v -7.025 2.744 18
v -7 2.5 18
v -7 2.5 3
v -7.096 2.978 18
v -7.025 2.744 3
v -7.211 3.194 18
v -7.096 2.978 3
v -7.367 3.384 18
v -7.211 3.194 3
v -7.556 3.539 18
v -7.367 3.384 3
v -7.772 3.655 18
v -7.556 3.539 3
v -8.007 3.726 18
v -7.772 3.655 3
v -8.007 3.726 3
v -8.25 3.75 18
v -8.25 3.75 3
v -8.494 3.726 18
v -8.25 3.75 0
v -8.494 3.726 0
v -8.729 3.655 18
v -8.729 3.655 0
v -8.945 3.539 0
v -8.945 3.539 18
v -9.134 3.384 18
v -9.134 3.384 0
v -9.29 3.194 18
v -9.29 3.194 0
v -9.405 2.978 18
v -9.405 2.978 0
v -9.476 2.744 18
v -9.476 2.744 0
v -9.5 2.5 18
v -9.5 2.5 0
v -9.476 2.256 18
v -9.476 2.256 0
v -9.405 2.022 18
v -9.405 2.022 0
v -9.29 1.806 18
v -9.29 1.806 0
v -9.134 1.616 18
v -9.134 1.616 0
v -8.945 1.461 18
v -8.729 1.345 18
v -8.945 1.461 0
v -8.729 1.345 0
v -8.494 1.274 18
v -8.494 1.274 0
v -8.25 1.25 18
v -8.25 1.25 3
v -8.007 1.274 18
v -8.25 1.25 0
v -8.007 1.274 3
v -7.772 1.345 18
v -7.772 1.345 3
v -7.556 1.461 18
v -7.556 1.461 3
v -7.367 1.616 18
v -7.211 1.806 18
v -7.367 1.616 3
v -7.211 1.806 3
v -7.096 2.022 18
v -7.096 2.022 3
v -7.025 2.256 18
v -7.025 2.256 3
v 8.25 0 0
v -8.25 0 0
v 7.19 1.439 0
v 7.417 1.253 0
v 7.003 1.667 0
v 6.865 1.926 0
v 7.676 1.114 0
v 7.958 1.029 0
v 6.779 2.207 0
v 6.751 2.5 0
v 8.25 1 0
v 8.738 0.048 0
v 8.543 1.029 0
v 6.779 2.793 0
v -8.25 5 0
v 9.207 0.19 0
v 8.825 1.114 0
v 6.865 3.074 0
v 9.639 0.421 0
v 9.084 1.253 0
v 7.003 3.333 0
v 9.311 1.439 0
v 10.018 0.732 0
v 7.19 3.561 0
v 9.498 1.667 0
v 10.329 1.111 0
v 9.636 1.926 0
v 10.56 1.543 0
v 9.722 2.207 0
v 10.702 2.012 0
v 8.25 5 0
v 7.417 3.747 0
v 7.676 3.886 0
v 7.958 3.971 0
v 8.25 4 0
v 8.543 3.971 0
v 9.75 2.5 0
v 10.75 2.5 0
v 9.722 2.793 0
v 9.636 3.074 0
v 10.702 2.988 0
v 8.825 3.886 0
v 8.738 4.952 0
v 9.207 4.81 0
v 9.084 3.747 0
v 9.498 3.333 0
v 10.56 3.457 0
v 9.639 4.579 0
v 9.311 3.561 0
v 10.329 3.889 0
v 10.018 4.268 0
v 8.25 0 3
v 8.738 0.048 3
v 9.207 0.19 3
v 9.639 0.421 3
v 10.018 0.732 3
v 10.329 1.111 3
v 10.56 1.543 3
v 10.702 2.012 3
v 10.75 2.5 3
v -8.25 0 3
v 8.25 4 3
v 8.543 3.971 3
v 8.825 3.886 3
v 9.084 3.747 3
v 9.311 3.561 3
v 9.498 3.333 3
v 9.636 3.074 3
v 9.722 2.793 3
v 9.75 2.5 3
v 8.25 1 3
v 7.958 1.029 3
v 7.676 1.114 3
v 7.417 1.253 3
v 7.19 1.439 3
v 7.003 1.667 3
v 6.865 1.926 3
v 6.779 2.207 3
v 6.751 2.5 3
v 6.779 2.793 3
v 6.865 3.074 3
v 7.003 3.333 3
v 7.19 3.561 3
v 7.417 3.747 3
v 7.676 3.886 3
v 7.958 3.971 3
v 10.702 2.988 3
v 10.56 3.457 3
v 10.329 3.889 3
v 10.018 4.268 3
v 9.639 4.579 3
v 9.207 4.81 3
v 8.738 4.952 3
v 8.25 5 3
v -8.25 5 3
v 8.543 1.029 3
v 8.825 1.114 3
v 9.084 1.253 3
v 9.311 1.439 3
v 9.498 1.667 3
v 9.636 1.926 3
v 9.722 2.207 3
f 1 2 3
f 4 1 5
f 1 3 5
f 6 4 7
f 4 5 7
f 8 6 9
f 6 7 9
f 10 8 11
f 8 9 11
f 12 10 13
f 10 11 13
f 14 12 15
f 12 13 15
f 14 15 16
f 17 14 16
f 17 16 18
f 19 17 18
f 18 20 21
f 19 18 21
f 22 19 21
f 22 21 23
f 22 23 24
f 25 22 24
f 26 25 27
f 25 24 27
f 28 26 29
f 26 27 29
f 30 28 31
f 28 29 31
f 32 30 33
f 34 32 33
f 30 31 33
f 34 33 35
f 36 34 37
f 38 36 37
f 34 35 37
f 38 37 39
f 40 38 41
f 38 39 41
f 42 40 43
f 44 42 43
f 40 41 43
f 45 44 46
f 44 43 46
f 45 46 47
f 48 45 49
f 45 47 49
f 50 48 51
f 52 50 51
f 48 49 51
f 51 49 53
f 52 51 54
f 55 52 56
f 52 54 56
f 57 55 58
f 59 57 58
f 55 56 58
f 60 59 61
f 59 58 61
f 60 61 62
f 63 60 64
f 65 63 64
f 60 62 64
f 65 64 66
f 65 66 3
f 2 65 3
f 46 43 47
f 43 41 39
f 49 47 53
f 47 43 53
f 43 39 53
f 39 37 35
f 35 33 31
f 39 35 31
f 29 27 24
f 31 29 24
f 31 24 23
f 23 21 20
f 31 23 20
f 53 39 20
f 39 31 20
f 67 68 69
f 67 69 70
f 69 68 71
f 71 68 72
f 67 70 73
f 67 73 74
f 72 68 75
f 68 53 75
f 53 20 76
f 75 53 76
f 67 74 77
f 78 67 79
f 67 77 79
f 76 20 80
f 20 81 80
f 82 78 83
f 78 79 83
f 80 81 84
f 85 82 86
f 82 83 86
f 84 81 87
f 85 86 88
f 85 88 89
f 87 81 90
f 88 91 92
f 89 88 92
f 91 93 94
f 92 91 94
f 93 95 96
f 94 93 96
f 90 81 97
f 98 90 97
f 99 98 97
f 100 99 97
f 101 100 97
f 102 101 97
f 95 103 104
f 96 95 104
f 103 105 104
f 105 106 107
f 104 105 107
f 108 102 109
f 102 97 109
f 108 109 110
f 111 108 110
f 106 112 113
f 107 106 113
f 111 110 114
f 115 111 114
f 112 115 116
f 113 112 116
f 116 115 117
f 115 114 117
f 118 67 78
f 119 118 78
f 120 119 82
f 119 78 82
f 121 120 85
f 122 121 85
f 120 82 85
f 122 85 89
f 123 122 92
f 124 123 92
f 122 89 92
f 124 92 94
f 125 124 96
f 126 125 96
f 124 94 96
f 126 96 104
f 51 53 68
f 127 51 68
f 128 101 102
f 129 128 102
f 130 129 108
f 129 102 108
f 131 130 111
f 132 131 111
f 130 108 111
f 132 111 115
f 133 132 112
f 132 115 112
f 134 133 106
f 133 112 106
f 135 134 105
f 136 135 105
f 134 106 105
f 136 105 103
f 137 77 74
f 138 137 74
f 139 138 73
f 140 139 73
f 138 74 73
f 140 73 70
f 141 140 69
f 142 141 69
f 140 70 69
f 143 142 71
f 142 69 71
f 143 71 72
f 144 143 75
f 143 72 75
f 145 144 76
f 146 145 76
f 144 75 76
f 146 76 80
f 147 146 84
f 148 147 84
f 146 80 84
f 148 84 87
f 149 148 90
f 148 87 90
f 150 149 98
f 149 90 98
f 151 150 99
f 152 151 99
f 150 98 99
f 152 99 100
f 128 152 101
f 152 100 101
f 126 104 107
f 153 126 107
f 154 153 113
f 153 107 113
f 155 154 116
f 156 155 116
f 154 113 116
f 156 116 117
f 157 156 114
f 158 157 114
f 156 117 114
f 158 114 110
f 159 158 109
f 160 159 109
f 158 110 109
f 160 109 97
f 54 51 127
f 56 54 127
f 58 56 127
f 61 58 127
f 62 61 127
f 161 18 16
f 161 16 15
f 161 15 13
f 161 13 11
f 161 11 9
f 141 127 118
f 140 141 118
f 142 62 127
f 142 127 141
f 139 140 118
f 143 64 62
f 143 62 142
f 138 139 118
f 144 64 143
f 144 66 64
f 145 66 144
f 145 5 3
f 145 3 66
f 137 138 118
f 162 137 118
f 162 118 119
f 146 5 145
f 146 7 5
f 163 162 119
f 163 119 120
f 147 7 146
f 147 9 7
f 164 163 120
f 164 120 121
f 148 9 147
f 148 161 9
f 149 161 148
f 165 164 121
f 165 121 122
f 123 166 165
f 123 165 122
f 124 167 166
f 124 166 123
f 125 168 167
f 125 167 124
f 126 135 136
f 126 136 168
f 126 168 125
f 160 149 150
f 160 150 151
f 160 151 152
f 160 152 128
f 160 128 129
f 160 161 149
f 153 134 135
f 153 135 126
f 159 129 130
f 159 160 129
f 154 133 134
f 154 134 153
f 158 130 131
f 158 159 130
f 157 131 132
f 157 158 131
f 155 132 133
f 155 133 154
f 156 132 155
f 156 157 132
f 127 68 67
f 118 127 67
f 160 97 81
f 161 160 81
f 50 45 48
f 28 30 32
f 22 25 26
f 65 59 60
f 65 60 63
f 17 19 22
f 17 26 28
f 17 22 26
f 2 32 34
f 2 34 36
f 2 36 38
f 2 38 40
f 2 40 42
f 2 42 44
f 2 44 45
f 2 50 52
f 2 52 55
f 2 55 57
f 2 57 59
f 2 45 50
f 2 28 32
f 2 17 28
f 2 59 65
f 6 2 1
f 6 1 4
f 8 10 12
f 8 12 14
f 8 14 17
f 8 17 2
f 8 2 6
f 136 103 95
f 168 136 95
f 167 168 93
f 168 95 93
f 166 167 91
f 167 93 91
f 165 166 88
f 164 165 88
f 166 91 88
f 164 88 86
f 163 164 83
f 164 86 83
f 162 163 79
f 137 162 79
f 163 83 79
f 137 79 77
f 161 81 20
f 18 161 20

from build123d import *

# Parameters (mm, degrees)
F1_DEPTH = 3
F2_DEPTH = 18


with BuildPart() as f1:
    # F0 (on Top) → F1 (new body)
    with BuildSketch(Plane.XY):
        with BuildLine():
            Line((8.2505, 5), (-8.2505, 5))
            Line((-8.2505, 5), (-8.2505, 3.75))
            ThreePointArc((-8.2505, 3.75), (-7.3666165235, 3.3838834765), (-7.0005, 2.5))
            ThreePointArc((-7.0005, 2.5), (-7.3666165235, 1.6161165235), (-8.2505, 1.25))
            Line((-8.2505, 1.25), (-8.2505, 0))
            Line((-8.2505, 0), (8.2505, 0))
            ThreePointArc((8.2505, 0), (5.7505, 2.5), (8.2505, 5))
        make_face()
        with BuildLine():
            ThreePointArc((10.7505, 2.5), (10.018266953, 4.267766953), (8.2505, 5))
            Line((8.2505, 5), (8.2505, 4))
            ThreePointArc((8.2505, 4), (9.3111601718, 3.5606601718), (9.7505, 2.5))
            ThreePointArc((9.7505, 2.5), (9.3111601718, 1.4393398282), (8.2505, 1))
            Line((8.2505, 1), (8.2505, 0))
            ThreePointArc((8.2505, 0), (10.018266953, 0.732233047), (10.7505, 2.5))
        make_face()
        with BuildLine():
            Line((8.2505, 4), (8.2505, 5))
            ThreePointArc((8.2505, 5), (5.7505, 2.5), (8.2505, 0))
            Line((8.2505, 0), (8.2505, 1))
            ThreePointArc((8.2505, 1), (6.7505, 2.5), (8.2505, 4))
        make_face()
        with BuildLine():
            ThreePointArc((-7.0005, 2.5), (-7.3666165235, 3.3838834765), (-8.2505, 3.75))
            Line((-8.2505, 3.75), (-8.2505, 1.25))
            ThreePointArc((-8.2505, 1.25), (-7.3666165235, 1.6161165235), (-7.0005, 2.5))
        make_face()
        with BuildLine():
            Line((-8.2505, 1.25), (-8.2505, 3.75))
            ThreePointArc((-8.2505, 3.75), (-9.5005, 2.5), (-8.2505, 1.25))
        make_face()
    extrude(amount=F1_DEPTH)

    # F0 (on Top) → F2 (join)
    with BuildSketch(Plane.XY):
        with BuildLine():
            ThreePointArc((-7.0005, 2.5), (-7.3666165235, 3.3838834765), (-8.2505, 3.75))
            Line((-8.2505, 3.75), (-8.2505, 1.25))
            ThreePointArc((-8.2505, 1.25), (-7.3666165235, 1.6161165235), (-7.0005, 2.5))
        make_face()
        with BuildLine():
            Line((-8.2505, 1.25), (-8.2505, 3.75))
            ThreePointArc((-8.2505, 3.75), (-9.5005, 2.5), (-8.2505, 1.25))
        make_face()
    extrude(amount=F2_DEPTH)


solid = f1.part
